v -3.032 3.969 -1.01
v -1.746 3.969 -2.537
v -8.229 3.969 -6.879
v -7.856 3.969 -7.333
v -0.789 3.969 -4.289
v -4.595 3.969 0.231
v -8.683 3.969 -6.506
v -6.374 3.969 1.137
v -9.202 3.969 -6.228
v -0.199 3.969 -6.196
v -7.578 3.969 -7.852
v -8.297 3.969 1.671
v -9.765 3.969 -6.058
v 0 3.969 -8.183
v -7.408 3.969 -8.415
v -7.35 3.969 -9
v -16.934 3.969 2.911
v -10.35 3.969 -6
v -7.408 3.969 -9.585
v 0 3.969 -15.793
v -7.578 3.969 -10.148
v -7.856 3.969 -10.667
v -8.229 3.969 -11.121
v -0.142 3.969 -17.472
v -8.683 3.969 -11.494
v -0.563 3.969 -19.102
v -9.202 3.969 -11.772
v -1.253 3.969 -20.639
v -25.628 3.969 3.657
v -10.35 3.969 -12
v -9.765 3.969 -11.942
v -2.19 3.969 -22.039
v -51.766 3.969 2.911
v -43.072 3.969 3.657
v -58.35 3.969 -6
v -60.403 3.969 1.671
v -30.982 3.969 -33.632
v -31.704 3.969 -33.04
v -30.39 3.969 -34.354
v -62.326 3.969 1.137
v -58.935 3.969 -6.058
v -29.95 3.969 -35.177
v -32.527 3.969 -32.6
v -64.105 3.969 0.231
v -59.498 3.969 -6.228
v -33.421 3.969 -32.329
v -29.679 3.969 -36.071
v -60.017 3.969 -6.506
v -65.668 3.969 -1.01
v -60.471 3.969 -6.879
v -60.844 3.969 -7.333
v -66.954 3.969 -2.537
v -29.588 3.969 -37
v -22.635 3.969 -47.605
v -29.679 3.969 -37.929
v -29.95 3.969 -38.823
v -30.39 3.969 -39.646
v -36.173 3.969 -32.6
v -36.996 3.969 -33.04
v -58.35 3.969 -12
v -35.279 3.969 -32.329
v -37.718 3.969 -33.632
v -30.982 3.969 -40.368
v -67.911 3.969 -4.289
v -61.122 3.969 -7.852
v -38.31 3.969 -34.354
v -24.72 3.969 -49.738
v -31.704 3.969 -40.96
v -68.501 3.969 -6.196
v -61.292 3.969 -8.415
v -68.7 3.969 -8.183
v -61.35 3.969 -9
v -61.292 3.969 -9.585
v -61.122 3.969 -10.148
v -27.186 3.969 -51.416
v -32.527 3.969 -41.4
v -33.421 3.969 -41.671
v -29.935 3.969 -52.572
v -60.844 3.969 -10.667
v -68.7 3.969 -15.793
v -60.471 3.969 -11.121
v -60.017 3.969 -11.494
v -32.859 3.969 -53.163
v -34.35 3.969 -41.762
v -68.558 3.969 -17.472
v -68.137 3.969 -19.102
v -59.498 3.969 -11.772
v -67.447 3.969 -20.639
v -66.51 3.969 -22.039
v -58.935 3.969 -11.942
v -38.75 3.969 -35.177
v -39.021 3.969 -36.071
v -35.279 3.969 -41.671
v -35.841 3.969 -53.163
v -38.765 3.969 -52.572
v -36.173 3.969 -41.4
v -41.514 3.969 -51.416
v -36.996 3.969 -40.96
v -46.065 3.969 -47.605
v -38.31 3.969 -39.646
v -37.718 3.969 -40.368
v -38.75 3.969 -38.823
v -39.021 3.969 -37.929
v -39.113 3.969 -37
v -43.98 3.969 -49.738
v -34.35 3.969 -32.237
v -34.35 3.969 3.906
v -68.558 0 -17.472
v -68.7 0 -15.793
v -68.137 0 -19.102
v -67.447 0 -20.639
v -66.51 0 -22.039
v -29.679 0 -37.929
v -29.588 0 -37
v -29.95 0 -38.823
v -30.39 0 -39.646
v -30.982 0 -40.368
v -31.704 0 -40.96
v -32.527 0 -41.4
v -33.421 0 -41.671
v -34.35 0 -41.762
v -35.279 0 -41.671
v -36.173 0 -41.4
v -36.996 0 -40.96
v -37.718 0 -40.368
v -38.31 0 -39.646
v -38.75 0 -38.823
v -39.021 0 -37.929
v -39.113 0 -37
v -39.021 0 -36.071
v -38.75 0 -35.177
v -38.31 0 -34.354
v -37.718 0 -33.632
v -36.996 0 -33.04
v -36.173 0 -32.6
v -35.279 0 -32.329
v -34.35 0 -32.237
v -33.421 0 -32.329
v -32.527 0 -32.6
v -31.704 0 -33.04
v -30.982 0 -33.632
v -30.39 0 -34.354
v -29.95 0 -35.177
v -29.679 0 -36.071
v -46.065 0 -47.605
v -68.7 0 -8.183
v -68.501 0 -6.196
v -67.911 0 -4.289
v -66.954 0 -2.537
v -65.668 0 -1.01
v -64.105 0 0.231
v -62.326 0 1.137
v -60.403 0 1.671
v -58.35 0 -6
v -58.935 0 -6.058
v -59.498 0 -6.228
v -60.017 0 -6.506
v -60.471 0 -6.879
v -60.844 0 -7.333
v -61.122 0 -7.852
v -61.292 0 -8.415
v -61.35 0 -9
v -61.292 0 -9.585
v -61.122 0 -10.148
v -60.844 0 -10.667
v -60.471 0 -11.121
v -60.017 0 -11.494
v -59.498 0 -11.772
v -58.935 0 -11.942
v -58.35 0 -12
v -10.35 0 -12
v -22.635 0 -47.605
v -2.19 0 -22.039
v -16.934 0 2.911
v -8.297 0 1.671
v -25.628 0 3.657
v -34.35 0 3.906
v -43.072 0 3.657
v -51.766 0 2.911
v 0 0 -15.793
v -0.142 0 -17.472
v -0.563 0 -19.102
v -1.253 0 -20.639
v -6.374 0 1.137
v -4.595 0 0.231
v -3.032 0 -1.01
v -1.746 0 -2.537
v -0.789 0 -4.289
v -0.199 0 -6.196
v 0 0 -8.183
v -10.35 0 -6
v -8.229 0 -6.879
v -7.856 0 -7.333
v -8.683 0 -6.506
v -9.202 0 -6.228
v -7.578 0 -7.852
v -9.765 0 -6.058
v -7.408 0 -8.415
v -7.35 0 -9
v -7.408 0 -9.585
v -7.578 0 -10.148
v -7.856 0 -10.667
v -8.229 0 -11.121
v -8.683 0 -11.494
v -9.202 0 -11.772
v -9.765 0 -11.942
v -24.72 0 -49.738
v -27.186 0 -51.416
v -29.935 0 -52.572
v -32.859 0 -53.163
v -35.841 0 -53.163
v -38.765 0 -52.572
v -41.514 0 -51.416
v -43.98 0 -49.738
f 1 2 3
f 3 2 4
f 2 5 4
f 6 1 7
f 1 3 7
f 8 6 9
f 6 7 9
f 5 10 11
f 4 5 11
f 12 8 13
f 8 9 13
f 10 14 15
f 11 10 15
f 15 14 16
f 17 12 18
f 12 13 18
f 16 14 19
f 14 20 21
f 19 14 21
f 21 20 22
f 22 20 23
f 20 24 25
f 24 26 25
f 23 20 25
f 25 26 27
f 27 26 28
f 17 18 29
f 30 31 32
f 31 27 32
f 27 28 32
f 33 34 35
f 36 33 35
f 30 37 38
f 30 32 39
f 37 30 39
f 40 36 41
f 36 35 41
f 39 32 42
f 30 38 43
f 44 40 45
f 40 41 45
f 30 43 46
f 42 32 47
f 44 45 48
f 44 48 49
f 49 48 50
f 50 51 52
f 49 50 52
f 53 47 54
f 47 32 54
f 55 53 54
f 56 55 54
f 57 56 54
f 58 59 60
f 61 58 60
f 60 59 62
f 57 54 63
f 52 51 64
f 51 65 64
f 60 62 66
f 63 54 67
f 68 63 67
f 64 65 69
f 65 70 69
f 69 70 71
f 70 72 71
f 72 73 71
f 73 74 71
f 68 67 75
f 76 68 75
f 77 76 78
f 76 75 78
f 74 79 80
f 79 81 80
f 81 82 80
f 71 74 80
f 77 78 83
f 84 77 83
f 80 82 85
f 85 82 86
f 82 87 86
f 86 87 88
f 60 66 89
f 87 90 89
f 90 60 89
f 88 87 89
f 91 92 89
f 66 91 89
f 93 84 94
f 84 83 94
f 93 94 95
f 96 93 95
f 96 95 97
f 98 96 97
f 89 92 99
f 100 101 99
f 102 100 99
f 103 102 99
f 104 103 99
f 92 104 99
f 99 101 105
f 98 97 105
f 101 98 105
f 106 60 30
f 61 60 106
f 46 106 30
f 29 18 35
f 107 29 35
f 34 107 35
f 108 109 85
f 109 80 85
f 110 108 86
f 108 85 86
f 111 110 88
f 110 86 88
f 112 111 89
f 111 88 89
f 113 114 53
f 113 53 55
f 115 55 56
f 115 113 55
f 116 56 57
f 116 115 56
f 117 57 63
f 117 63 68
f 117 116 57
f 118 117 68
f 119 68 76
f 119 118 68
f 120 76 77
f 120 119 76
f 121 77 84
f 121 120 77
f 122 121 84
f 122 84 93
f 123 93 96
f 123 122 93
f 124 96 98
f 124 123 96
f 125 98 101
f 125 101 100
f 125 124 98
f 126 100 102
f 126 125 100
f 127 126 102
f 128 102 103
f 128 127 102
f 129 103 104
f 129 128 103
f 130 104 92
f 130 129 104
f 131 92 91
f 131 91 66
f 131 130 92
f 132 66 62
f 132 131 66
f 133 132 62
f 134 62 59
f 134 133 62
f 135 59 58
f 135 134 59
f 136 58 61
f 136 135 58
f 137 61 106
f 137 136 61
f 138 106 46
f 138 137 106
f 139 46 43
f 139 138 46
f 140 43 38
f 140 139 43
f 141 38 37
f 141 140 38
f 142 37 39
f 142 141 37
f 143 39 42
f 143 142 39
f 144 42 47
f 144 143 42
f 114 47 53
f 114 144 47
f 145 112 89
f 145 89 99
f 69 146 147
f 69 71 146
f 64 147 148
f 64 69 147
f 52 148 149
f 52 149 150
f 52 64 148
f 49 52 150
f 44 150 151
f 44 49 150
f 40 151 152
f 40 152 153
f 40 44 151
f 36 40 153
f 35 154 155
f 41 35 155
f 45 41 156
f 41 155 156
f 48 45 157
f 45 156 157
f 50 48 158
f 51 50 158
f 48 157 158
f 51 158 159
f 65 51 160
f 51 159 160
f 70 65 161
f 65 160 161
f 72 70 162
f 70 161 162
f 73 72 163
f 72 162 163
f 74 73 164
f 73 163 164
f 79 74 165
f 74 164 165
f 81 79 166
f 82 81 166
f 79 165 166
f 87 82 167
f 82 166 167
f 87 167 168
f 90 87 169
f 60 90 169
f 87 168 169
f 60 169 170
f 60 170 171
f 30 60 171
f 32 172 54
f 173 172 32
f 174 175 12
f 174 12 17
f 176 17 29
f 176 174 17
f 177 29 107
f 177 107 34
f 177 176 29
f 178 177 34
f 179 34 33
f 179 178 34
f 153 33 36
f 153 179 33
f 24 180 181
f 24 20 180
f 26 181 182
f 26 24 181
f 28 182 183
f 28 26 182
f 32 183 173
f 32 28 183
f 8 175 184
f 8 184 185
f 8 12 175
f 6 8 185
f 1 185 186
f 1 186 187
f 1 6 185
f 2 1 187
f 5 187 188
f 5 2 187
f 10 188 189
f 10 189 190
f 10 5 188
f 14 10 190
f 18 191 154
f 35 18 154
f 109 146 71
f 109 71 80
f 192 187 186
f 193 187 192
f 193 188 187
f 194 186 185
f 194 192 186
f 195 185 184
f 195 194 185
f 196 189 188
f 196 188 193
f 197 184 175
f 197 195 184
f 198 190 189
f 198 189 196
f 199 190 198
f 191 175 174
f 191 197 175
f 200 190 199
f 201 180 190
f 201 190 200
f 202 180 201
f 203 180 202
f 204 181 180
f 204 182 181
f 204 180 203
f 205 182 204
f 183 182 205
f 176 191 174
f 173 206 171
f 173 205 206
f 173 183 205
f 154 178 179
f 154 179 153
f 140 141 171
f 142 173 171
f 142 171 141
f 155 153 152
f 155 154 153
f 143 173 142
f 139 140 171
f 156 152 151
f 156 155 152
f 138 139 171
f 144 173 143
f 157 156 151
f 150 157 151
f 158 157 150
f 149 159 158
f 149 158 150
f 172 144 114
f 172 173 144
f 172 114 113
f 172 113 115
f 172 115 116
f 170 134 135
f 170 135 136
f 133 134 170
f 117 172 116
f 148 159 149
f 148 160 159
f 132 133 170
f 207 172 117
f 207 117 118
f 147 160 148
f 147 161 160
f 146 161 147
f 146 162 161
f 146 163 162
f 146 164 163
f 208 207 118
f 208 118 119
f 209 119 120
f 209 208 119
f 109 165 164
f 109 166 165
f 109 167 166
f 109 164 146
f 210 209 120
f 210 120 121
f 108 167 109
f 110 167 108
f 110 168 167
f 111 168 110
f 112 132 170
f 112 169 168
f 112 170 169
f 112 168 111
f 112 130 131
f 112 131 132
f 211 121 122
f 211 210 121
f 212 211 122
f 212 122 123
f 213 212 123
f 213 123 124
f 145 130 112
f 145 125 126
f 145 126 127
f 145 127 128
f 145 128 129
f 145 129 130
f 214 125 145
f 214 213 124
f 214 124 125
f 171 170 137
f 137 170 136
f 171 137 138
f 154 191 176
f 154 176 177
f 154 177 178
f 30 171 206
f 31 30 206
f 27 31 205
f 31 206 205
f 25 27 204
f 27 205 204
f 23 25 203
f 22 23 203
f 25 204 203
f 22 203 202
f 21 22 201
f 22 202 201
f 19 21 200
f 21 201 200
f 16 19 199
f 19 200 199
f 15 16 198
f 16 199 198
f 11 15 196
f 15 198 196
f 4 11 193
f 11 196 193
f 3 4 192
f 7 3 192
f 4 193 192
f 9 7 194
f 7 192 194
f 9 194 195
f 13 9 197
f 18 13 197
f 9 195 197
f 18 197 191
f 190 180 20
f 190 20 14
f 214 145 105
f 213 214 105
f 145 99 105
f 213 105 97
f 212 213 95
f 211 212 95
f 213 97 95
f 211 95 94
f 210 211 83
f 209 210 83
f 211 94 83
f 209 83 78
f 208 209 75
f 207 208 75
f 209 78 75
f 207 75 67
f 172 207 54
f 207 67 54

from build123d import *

# Parameters (mm, degrees)
SKETCH1_R           = 4.7625
BOSS_EXTRUDE1_DEPTH = 3.96875
FILLET1_R           = 10
FILLET2_R           = 15


with BuildPart() as part:
    # Sketch1 → Boss-Extrude1 (new body)
    with BuildSketch(Plane(origin=(0, 0, 0), x_dir=(1, 0, 0), z_dir=(0, 1, 0))):
        with BuildLine():
            Line((-68.7, 0), (-68.7, 19.3))
            Line((-68.7, 19.3), (-34.35, 62.254365319))
            Line((-34.35, 62.254365319), (0, 19.3))
            Line((0, 19.3), (0, 0))
            ThreePointArc((0, 0), (-34.35, -3.905912777), (-68.7, 0))
        make_face()
        with Locations((-34.35, 37)):
            Circle(SKETCH1_R, mode=Mode.SUBTRACT)
        with BuildLine():
            Line((-58.35, 12), (-10.35, 12))
            ThreePointArc((-10.35, 12), (-7.35, 9), (-10.35, 6))
            Line((-10.35, 6), (-58.35, 6))
            ThreePointArc((-58.35, 6), (-61.35, 9), (-58.35, 12))
        make_face(mode=Mode.SUBTRACT)
    extrude(amount=BOSS_EXTRUDE1_DEPTH)

    # Fillet1
    fillet1_edges = [part.edges().sort_by_distance(p)[0] for p in [
        (-68.7, 1.984375, 0),
        (-68.7, 1.984375, -19.3),
        (0, 1.984375, -19.3),
        (0, 1.984375, 0),
    ]]
    fillet(fillet1_edges, radius=FILLET1_R)

    # Fillet2
    fillet2_edges = [part.edges().sort_by_distance(p)[0] for p in [
        (-34.35, 1.984375, -62.254365319),
    ]]
    fillet(fillet2_edges, radius=FILLET2_R)


solid = part.part
